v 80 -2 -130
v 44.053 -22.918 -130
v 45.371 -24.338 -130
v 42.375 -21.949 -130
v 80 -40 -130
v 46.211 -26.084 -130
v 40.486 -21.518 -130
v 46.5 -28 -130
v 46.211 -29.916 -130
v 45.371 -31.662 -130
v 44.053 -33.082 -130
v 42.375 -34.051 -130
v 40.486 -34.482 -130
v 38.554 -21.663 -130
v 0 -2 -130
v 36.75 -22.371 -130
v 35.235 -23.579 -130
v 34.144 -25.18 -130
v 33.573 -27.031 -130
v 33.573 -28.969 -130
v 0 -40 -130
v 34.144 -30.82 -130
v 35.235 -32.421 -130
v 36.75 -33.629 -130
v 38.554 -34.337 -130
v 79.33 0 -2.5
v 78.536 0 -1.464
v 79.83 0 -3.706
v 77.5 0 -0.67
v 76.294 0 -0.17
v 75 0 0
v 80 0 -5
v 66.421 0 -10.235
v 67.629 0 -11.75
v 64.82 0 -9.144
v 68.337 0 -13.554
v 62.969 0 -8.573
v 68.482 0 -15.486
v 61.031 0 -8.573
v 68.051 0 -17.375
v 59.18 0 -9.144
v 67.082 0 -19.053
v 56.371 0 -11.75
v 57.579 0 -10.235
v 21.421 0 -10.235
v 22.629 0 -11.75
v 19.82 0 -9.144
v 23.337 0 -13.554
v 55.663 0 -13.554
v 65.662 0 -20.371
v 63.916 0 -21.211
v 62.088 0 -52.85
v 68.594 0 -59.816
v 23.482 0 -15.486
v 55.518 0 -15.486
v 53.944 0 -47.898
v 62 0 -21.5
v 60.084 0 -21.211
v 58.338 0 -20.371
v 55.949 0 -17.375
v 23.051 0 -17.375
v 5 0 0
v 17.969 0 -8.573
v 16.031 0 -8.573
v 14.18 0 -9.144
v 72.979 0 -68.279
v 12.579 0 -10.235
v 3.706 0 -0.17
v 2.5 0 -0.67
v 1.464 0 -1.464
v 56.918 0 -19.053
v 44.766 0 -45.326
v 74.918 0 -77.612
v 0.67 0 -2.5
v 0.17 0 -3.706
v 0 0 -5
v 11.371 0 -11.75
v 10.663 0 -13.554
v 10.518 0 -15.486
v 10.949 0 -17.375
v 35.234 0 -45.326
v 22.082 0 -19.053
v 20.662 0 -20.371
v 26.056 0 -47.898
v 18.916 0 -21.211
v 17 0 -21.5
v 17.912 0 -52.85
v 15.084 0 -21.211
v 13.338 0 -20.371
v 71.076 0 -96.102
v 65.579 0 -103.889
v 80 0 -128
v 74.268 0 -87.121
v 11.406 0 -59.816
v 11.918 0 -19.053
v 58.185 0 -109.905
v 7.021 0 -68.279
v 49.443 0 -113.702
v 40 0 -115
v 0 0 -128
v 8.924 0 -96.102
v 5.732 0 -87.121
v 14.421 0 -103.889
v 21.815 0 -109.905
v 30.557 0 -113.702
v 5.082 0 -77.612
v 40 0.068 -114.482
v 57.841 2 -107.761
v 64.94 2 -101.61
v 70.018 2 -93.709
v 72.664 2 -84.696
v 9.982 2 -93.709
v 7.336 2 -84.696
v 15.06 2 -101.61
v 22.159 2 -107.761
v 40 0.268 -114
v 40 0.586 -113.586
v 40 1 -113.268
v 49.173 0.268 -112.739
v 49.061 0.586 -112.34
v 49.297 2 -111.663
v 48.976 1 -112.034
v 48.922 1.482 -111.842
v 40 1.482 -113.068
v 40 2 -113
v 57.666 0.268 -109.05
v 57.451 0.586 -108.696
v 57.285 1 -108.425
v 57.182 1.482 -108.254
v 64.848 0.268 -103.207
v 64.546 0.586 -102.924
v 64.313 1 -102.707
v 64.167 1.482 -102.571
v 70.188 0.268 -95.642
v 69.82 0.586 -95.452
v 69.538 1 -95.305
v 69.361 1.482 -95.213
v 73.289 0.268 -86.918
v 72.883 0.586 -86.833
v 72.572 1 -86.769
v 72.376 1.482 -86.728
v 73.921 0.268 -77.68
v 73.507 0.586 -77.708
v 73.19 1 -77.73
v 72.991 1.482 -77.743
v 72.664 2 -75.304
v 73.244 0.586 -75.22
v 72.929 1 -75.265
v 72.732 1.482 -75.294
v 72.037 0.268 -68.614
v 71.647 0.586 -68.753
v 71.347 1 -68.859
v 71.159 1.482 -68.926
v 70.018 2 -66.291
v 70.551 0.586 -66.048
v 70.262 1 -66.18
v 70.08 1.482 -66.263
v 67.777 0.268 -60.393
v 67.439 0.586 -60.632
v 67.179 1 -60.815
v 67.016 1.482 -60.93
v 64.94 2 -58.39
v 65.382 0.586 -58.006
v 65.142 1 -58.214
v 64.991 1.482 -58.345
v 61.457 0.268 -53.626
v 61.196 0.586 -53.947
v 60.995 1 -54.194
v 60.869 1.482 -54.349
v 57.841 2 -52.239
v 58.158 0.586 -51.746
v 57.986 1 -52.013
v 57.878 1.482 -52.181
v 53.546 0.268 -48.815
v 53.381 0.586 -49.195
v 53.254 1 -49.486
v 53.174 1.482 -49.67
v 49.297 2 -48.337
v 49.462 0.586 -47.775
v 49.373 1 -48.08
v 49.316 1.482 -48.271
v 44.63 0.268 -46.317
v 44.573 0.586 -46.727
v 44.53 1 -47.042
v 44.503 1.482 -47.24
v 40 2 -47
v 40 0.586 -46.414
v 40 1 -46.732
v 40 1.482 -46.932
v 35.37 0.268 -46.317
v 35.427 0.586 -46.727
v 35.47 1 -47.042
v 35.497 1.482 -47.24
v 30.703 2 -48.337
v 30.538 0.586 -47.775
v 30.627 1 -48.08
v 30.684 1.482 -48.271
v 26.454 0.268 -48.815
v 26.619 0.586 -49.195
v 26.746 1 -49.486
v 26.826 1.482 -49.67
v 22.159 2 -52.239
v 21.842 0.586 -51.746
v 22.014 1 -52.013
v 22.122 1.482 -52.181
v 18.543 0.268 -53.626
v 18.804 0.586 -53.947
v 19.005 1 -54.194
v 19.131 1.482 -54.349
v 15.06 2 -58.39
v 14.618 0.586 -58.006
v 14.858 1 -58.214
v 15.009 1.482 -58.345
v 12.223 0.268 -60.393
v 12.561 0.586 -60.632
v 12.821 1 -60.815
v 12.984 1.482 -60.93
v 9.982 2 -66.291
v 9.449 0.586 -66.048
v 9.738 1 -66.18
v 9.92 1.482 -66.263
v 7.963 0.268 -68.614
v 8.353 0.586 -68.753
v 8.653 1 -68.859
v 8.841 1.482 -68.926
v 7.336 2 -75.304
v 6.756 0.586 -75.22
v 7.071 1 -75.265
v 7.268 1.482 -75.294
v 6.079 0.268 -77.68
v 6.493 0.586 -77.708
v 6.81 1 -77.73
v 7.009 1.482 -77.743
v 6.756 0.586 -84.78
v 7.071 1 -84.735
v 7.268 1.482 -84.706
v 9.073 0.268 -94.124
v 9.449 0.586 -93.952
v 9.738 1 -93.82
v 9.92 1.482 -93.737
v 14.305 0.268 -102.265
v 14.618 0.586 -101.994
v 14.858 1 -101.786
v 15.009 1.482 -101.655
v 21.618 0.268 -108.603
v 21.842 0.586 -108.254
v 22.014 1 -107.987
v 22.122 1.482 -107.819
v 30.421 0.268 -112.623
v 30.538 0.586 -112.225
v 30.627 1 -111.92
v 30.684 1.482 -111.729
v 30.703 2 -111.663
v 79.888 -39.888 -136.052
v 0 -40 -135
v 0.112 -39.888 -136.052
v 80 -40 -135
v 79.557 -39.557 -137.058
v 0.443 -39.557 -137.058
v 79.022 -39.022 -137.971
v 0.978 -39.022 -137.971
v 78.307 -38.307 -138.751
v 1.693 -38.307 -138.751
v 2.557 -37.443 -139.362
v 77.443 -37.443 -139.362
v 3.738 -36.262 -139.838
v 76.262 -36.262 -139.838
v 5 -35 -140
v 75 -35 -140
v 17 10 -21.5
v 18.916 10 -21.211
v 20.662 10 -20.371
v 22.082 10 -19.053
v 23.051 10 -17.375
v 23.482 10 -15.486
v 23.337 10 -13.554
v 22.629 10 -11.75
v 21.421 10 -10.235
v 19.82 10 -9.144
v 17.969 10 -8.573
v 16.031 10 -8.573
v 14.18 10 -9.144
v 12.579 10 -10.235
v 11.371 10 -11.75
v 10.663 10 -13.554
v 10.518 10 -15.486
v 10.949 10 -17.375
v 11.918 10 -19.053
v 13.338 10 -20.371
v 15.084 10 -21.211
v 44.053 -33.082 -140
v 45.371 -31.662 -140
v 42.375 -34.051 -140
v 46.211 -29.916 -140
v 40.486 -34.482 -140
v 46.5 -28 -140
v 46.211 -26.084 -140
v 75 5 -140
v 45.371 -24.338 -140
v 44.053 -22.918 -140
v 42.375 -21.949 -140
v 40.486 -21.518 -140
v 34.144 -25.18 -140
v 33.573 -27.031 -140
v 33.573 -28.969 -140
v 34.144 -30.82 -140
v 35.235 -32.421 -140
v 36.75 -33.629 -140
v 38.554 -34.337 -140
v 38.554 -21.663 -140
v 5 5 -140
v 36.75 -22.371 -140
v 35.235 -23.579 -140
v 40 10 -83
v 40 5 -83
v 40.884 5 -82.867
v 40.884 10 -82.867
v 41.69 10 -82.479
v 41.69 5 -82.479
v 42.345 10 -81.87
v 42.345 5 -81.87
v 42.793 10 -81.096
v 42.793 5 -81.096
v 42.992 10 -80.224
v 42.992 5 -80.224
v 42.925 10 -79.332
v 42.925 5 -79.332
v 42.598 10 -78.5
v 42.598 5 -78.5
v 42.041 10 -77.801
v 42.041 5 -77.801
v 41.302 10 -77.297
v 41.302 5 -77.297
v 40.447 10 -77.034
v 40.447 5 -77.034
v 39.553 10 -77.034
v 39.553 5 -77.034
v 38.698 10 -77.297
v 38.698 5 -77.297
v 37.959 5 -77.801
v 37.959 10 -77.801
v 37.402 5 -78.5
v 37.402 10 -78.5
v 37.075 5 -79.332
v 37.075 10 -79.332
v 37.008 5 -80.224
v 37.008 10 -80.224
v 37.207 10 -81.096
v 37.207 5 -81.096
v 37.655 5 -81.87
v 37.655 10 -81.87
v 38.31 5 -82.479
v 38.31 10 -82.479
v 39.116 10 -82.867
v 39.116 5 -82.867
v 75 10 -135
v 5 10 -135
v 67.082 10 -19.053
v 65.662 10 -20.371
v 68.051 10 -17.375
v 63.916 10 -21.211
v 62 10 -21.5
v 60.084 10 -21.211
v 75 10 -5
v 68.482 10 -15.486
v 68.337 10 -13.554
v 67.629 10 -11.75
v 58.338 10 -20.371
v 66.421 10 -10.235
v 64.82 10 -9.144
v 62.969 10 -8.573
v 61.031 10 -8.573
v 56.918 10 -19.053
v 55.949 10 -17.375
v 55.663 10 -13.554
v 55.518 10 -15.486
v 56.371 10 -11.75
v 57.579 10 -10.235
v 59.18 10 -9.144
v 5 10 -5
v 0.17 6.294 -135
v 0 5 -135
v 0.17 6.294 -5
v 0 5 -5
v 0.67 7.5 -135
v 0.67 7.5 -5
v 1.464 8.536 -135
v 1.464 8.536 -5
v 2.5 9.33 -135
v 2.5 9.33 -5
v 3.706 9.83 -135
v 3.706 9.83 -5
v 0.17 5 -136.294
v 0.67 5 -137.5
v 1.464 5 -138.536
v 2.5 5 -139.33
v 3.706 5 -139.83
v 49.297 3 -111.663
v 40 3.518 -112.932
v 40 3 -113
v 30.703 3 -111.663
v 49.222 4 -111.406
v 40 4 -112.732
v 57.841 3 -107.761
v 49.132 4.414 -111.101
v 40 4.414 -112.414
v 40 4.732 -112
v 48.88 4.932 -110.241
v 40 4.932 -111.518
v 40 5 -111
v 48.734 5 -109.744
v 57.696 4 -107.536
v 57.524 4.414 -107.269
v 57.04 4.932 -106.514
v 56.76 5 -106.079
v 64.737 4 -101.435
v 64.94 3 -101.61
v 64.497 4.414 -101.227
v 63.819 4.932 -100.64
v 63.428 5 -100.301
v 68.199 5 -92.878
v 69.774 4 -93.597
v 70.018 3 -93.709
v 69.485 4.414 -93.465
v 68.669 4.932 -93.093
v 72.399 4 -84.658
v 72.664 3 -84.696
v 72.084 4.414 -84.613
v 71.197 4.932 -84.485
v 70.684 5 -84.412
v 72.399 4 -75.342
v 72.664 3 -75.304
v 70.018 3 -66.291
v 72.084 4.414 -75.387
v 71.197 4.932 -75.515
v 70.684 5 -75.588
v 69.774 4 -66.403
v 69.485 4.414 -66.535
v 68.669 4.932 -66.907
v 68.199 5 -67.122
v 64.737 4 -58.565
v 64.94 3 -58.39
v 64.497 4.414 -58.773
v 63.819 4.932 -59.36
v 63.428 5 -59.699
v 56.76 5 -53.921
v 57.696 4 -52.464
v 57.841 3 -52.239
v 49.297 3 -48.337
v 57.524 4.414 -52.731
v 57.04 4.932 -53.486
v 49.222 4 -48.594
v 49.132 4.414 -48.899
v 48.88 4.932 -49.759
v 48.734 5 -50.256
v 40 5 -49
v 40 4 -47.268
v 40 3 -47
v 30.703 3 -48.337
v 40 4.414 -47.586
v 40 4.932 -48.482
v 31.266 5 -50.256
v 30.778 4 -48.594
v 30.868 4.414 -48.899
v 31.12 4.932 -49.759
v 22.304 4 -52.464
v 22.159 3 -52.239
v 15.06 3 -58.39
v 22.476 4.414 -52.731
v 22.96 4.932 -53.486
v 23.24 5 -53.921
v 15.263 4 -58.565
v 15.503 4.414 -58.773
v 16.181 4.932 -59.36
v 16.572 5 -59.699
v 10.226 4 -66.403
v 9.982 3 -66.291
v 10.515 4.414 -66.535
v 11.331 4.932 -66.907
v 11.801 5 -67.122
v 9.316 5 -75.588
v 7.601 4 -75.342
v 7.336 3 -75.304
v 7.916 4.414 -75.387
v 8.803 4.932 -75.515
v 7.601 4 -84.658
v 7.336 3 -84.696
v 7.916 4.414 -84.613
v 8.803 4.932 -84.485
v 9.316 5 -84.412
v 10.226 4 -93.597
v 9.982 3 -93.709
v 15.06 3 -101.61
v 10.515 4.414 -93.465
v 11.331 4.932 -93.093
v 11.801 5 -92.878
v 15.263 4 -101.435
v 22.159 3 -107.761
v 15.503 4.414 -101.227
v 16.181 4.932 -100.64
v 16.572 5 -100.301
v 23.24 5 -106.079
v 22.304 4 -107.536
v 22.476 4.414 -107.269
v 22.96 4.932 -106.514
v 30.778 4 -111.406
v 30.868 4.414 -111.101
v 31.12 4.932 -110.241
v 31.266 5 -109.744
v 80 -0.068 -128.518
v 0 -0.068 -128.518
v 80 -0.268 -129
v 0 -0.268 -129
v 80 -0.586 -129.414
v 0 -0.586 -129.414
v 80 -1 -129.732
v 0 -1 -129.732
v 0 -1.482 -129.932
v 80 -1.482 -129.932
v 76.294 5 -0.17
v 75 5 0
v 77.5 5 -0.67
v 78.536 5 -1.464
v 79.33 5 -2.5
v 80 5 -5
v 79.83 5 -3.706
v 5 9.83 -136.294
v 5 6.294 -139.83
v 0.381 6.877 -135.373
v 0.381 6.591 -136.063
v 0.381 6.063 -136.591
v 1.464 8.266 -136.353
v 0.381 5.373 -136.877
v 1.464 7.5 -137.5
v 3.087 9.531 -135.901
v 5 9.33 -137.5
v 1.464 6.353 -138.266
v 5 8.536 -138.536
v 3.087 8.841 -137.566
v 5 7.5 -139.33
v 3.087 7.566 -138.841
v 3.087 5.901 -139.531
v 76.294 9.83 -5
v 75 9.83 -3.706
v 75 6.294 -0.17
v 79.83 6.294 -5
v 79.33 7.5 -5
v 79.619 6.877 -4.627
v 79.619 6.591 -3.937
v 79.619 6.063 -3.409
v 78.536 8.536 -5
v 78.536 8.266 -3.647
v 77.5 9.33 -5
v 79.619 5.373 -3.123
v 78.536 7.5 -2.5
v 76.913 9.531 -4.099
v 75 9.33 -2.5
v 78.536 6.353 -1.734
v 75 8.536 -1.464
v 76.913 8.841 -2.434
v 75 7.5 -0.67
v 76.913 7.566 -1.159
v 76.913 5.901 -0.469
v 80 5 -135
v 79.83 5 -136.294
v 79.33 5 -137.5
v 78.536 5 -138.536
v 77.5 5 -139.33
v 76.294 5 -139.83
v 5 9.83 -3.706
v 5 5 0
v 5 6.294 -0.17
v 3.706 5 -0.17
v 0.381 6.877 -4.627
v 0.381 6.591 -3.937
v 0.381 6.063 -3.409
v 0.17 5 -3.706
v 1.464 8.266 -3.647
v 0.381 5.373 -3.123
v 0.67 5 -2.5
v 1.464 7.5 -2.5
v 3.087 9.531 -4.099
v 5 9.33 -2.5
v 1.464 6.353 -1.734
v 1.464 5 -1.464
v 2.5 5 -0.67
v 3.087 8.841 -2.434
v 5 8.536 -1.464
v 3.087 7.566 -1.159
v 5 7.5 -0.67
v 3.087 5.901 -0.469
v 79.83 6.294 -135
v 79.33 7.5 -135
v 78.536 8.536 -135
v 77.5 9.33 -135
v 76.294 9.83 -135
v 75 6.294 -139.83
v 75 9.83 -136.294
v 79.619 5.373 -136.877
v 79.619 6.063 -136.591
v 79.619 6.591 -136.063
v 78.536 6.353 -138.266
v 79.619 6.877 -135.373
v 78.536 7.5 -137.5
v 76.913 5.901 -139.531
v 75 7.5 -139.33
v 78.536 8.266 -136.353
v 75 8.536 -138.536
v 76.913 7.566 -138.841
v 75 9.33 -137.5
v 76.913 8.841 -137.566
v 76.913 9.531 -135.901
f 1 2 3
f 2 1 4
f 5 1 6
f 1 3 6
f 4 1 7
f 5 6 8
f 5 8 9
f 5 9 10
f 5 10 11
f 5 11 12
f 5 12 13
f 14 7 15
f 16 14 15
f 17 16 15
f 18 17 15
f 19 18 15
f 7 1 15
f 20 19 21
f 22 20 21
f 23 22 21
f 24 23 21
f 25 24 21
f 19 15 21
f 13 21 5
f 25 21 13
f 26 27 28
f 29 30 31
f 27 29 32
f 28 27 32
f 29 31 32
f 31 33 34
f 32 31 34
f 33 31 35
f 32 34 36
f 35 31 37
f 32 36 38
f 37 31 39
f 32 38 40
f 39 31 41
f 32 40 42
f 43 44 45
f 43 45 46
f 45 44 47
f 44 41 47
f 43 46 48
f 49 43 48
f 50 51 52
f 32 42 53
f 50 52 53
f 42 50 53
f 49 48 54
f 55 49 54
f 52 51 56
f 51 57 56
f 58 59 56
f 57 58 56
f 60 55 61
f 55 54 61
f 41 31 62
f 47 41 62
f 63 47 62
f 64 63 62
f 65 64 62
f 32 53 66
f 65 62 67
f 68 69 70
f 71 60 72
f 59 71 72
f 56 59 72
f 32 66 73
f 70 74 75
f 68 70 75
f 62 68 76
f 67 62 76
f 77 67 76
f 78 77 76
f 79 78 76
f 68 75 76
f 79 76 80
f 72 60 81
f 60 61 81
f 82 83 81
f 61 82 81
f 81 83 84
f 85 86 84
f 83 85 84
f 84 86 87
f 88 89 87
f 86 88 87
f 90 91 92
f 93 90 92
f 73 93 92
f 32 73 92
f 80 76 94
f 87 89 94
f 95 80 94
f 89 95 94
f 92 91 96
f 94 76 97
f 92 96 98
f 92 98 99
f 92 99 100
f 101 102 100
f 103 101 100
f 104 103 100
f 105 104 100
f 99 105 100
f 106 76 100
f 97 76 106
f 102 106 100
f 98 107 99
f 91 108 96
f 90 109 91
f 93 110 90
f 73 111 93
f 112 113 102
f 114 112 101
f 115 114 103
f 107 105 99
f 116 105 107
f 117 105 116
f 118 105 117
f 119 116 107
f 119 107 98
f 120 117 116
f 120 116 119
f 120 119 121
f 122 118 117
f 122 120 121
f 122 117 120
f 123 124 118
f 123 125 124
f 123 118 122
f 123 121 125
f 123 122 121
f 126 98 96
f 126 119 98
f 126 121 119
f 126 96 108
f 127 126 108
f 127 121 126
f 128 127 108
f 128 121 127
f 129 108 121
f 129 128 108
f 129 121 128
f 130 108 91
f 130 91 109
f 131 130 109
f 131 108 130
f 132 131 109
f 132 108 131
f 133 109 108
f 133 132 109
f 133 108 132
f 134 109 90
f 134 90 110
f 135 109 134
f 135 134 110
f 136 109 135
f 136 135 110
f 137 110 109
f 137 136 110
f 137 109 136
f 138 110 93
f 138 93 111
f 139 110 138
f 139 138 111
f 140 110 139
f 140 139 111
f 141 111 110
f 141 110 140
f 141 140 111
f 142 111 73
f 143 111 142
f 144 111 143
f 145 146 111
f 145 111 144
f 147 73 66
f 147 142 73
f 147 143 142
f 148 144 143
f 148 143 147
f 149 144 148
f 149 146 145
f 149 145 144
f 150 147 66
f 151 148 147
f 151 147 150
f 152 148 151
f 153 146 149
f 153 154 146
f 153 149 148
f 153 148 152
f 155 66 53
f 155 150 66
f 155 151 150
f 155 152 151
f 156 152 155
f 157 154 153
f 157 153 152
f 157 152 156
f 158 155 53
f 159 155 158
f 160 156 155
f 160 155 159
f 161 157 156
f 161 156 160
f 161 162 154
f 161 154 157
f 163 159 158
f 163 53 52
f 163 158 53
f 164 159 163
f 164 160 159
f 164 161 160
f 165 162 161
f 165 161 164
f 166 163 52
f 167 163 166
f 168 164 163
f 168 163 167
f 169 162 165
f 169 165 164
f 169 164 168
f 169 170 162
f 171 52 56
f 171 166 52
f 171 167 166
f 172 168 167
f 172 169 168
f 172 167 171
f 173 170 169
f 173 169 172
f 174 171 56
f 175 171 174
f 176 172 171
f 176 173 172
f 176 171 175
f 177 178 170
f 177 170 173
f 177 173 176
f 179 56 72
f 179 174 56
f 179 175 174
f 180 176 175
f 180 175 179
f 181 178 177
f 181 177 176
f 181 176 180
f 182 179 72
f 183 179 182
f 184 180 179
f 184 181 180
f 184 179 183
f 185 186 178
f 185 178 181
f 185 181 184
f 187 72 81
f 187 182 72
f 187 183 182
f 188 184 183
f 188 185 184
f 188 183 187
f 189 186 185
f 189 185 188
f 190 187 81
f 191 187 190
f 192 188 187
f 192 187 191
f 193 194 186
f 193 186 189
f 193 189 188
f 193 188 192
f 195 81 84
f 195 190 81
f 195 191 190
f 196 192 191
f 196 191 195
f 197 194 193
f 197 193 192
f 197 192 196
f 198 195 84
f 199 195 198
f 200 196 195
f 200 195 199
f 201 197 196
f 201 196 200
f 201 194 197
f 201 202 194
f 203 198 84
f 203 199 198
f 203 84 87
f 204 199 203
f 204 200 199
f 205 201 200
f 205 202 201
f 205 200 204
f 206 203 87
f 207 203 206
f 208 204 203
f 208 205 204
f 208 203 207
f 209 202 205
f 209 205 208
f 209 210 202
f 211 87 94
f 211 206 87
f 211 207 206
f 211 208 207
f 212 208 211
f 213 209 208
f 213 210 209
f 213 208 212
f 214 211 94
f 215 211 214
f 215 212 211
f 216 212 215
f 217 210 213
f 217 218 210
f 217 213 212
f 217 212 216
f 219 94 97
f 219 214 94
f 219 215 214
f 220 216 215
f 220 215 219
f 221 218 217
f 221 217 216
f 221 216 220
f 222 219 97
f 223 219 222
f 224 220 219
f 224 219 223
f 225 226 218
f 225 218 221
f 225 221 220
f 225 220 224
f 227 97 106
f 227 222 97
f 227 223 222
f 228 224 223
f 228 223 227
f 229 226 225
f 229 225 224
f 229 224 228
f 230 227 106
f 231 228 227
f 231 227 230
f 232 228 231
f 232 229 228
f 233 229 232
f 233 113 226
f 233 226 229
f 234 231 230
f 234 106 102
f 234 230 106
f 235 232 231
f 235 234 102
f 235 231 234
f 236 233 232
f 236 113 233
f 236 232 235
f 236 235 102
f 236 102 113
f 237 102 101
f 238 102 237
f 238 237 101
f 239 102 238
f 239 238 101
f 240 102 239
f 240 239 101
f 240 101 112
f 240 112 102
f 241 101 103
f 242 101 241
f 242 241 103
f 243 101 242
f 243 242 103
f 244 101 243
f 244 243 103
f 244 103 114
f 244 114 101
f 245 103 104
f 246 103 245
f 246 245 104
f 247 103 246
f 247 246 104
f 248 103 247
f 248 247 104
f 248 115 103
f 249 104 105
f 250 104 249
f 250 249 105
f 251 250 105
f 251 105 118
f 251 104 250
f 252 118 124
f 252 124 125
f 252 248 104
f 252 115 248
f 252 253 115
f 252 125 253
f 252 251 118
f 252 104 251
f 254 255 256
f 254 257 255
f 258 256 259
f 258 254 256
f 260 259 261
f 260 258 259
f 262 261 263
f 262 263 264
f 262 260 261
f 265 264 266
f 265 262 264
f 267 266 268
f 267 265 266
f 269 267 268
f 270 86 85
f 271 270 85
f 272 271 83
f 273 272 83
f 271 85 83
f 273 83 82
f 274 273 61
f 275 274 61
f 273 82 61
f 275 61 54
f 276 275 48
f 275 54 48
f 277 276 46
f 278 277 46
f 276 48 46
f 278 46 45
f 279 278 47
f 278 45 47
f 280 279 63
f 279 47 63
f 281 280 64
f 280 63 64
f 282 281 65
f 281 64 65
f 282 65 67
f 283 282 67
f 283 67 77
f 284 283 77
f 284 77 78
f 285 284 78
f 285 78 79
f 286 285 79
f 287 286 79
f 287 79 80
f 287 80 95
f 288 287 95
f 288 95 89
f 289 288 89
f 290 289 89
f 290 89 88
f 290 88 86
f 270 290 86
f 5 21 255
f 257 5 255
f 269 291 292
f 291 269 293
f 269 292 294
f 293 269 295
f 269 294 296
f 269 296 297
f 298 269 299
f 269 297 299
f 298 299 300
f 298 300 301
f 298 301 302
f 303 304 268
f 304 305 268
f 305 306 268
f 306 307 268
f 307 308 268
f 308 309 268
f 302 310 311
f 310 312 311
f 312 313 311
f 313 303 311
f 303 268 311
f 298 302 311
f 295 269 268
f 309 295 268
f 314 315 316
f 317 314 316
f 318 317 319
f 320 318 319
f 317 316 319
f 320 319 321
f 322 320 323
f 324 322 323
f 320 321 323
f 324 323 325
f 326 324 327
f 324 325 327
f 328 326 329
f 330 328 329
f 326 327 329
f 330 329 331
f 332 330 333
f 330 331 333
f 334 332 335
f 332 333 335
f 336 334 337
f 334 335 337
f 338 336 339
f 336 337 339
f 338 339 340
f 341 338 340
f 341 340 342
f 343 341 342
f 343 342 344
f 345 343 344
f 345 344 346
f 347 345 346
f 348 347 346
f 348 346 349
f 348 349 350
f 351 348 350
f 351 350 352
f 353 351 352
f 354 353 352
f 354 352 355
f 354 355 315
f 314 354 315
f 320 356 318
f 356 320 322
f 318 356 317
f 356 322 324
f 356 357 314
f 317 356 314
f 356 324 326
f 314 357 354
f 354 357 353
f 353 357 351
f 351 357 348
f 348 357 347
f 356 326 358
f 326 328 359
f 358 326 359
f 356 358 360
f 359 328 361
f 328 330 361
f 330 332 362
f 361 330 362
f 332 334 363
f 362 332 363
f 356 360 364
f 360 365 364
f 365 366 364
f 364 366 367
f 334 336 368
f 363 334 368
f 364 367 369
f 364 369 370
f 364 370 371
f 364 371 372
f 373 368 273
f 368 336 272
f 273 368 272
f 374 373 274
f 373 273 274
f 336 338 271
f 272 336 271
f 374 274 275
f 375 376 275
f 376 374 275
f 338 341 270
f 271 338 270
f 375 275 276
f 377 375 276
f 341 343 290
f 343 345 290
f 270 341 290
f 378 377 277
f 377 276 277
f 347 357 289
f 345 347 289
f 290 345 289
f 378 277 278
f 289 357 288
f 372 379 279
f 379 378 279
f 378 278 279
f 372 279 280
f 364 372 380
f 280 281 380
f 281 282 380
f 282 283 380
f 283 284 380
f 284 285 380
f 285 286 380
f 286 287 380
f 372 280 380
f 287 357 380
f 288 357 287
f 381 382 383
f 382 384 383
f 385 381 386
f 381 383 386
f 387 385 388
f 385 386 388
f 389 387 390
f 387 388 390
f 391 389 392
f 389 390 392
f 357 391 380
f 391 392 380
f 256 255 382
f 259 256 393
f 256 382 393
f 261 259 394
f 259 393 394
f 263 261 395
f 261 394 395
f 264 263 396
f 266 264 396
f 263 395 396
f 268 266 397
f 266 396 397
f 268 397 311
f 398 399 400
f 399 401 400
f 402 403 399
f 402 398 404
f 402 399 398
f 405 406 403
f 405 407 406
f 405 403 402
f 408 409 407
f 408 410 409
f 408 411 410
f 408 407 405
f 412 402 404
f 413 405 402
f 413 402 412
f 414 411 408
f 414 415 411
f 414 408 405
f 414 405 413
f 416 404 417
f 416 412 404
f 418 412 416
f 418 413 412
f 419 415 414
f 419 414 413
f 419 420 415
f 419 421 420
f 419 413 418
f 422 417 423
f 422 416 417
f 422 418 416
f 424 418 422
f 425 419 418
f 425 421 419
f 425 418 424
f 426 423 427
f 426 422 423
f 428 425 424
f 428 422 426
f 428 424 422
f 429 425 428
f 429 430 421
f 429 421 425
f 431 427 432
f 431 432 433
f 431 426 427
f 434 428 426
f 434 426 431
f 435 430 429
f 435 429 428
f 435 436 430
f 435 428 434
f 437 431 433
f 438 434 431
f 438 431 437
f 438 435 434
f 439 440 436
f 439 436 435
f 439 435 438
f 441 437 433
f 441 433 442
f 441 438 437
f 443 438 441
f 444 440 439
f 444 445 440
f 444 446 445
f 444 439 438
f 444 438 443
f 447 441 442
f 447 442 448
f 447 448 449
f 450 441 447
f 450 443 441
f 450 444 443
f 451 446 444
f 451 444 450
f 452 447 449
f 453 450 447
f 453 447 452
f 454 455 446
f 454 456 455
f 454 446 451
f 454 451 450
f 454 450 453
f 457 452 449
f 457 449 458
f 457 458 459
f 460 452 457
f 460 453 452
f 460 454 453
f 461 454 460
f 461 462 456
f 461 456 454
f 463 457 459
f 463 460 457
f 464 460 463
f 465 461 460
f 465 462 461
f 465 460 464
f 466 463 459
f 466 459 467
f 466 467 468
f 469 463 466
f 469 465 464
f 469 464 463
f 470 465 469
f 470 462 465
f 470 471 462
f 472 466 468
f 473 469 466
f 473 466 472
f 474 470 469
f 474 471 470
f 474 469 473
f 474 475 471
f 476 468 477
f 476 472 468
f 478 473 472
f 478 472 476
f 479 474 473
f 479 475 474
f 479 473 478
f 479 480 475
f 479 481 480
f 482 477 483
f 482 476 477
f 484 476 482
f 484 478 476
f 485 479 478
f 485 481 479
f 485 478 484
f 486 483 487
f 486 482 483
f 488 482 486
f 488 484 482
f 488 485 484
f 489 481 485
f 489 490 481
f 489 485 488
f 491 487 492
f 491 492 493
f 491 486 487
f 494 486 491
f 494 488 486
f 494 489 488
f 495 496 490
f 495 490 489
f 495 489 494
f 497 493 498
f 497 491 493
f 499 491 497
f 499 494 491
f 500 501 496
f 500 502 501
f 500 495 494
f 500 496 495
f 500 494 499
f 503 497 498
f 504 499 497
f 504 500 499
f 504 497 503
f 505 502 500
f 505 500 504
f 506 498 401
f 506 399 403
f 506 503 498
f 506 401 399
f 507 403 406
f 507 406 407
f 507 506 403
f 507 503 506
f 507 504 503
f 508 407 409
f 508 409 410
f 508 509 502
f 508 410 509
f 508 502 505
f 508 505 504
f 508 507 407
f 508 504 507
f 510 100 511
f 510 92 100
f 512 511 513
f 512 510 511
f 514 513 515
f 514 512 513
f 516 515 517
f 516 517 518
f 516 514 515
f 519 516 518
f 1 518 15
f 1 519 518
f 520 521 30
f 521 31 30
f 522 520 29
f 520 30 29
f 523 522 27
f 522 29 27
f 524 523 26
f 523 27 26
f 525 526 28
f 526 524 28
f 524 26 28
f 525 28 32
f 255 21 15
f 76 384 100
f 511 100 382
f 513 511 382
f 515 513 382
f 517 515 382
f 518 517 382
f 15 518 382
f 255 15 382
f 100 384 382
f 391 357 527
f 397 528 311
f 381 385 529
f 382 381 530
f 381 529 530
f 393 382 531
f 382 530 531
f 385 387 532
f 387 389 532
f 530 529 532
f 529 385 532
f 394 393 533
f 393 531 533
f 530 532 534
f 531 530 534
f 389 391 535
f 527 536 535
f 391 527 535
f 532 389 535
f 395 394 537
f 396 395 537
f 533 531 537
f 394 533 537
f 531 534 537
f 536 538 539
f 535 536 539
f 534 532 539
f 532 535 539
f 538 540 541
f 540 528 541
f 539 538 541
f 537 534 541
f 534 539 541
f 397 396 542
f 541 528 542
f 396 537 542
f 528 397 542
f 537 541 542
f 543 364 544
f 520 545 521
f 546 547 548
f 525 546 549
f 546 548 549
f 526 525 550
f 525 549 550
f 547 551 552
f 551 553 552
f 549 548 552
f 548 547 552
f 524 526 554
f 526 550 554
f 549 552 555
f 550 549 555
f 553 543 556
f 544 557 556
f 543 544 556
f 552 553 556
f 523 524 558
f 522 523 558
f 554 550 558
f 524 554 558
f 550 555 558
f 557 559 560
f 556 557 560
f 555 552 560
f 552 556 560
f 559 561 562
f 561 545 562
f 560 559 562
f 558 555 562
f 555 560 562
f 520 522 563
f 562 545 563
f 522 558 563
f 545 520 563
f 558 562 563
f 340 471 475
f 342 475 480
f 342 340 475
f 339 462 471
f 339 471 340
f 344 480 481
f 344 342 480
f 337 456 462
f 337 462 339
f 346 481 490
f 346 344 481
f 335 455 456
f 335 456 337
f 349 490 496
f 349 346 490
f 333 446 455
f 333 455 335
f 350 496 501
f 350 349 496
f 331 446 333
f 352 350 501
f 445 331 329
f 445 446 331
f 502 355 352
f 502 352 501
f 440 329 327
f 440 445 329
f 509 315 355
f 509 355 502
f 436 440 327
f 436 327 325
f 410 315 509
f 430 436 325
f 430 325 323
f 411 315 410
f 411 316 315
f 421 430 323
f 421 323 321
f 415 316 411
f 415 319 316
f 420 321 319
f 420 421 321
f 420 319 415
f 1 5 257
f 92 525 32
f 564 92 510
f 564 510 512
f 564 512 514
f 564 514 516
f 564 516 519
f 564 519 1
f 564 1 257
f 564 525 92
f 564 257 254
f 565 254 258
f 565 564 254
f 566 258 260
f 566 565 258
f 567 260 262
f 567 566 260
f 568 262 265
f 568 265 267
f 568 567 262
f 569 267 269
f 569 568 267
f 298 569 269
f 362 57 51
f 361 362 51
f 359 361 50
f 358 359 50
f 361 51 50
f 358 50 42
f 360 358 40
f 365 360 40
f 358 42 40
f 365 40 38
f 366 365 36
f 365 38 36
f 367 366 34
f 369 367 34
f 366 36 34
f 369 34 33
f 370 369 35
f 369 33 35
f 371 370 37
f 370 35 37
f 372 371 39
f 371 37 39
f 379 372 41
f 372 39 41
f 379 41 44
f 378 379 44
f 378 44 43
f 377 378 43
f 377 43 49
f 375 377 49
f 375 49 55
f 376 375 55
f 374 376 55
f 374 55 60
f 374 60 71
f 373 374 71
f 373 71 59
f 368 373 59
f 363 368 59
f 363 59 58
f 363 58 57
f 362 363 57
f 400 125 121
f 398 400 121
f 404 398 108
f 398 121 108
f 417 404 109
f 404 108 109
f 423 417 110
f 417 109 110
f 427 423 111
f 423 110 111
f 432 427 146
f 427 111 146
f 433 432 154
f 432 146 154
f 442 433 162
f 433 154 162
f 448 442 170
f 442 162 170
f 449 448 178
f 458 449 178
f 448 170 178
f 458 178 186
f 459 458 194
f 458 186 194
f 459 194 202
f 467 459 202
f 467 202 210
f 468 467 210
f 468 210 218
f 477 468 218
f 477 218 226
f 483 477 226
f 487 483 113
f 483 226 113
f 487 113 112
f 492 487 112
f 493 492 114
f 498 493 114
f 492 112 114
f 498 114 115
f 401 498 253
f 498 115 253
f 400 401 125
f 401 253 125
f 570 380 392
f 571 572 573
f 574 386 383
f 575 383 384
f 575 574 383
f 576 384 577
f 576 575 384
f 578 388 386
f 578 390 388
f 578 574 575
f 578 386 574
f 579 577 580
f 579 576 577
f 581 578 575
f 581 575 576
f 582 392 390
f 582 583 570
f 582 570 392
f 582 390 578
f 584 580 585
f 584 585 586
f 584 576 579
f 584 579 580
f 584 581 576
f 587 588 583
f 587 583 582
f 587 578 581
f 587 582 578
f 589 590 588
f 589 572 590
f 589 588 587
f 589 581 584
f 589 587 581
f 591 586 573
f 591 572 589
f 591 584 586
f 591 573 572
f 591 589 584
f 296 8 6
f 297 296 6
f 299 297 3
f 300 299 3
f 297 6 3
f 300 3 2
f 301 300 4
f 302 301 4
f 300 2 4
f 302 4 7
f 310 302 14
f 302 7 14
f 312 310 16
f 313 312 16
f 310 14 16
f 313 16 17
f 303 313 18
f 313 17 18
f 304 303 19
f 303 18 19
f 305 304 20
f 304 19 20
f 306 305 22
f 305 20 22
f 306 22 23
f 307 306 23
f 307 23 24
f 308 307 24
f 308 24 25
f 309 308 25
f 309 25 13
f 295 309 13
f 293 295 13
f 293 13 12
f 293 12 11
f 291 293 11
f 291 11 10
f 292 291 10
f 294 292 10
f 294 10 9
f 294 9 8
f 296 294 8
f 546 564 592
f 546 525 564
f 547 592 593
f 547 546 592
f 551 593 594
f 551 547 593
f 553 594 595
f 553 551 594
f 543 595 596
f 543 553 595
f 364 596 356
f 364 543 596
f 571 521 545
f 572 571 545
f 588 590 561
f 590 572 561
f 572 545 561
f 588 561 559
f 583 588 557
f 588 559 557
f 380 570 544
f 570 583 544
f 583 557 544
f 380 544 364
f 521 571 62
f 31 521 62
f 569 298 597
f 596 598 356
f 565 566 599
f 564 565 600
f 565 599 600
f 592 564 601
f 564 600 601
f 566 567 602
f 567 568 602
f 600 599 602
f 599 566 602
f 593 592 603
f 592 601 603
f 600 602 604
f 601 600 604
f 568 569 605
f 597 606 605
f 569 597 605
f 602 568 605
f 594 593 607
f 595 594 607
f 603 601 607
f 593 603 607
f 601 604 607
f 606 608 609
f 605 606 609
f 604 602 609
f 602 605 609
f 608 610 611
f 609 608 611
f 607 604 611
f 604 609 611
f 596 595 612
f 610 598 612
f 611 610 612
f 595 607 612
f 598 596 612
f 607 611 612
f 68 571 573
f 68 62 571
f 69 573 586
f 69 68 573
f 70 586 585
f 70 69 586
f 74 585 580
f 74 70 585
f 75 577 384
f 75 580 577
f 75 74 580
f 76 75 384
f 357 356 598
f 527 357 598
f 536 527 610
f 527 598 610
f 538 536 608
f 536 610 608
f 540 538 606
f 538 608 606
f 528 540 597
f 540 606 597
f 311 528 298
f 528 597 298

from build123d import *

# Parameters (mm, degrees)
BOSS_EXTRUDE1_DEPTH = 80
SKETCH2_R           = 6.5
CUT_EXTRUDE1_DEPTH  = 167.132477258
SKETCH3_R           = 33
CUT_EXTRUDE2_DEPTH  = 5
FILLET1_R           = 2
SKETCH4_R           = 6.5
CUT_EXTRUDE3_DEPTH  = 158.797338381
FILLET2_R           = 5
FILLET3_R           = 2
SKETCH5_R           = 3
CUT_EXTRUDE4_DEPTH  = 168.406690428


with BuildPart() as part:
    # Sketch1 → Boss-Extrude1 (new body)
    with BuildSketch(Plane(origin=(0, 0, 0), x_dir=(0, 0, -1), z_dir=(1, 0, 0))):
        Polygon((0, 0), (130, 0), (130, -40), (140, -40), (140, 10), (0, 10), align=None)
    extrude(amount=BOSS_EXTRUDE1_DEPTH)

    # Sketch2 → Cut-Extrude1 (cut, through all)
    with BuildSketch(Plane.XZ):
        with Locations(Location((17, -15, 0), (0, 0, 270))):
            Circle(SKETCH2_R)
        with Locations(Location((62, -15, 0), (0, 0, 270))):
            Circle(SKETCH2_R)
    extrude(amount=-CUT_EXTRUDE1_DEPTH, mode=Mode.SUBTRACT)

    # Sketch3 → Cut-Extrude2 (cut)
    with BuildSketch(Plane.XZ):
        with Locations(Location((40, -80, 0), (0, 0, 270))):
            Circle(SKETCH3_R)
    extrude(amount=-CUT_EXTRUDE2_DEPTH, mode=Mode.SUBTRACT)

    # Fillet1
    fillet1_edges = [part.edges().sort_by_distance(p)[0] for p in [
        (40, 5, -47),
        (40, 0, -47),
    ]]
    fillet(fillet1_edges, radius=FILLET1_R)

    # Sketch4 → Cut-Extrude3 (cut, through all)
    with BuildSketch(Plane.XY.offset(-130)):
        with Locations((40, -28)):
            Circle(SKETCH4_R)
    extrude(amount=-CUT_EXTRUDE3_DEPTH, mode=Mode.SUBTRACT)

    # Fillet2
    fillet2_edges = [part.edges().sort_by_distance(p)[0] for p in [
        (40, 10, 0),
        (40, 10, -140),
        (40, -40, -140),
        (80, -15, -140),
        (80, 10, -70),
        (80, 5, 0),
        (0, 10, -70),
        (0, -15, -140),
        (0, 5, 0),
    ]]
    fillet(fillet2_edges, radius=FILLET2_R)

    # Fillet3
    fillet3_edges = [part.edges().sort_by_distance(p)[0] for p in [
        (40, 0, -130),
    ]]
    fillet(fillet3_edges, radius=FILLET3_R)

    # Sketch5 → Cut-Extrude4 (cut, through all)
    with BuildSketch(Plane.XZ.offset(-5)):
        with Locations(Location((40, -80, 0), (0, 0, 270))):
            Circle(SKETCH5_R)
    extrude(amount=-CUT_EXTRUDE4_DEPTH, mode=Mode.SUBTRACT)


solid = part.part
